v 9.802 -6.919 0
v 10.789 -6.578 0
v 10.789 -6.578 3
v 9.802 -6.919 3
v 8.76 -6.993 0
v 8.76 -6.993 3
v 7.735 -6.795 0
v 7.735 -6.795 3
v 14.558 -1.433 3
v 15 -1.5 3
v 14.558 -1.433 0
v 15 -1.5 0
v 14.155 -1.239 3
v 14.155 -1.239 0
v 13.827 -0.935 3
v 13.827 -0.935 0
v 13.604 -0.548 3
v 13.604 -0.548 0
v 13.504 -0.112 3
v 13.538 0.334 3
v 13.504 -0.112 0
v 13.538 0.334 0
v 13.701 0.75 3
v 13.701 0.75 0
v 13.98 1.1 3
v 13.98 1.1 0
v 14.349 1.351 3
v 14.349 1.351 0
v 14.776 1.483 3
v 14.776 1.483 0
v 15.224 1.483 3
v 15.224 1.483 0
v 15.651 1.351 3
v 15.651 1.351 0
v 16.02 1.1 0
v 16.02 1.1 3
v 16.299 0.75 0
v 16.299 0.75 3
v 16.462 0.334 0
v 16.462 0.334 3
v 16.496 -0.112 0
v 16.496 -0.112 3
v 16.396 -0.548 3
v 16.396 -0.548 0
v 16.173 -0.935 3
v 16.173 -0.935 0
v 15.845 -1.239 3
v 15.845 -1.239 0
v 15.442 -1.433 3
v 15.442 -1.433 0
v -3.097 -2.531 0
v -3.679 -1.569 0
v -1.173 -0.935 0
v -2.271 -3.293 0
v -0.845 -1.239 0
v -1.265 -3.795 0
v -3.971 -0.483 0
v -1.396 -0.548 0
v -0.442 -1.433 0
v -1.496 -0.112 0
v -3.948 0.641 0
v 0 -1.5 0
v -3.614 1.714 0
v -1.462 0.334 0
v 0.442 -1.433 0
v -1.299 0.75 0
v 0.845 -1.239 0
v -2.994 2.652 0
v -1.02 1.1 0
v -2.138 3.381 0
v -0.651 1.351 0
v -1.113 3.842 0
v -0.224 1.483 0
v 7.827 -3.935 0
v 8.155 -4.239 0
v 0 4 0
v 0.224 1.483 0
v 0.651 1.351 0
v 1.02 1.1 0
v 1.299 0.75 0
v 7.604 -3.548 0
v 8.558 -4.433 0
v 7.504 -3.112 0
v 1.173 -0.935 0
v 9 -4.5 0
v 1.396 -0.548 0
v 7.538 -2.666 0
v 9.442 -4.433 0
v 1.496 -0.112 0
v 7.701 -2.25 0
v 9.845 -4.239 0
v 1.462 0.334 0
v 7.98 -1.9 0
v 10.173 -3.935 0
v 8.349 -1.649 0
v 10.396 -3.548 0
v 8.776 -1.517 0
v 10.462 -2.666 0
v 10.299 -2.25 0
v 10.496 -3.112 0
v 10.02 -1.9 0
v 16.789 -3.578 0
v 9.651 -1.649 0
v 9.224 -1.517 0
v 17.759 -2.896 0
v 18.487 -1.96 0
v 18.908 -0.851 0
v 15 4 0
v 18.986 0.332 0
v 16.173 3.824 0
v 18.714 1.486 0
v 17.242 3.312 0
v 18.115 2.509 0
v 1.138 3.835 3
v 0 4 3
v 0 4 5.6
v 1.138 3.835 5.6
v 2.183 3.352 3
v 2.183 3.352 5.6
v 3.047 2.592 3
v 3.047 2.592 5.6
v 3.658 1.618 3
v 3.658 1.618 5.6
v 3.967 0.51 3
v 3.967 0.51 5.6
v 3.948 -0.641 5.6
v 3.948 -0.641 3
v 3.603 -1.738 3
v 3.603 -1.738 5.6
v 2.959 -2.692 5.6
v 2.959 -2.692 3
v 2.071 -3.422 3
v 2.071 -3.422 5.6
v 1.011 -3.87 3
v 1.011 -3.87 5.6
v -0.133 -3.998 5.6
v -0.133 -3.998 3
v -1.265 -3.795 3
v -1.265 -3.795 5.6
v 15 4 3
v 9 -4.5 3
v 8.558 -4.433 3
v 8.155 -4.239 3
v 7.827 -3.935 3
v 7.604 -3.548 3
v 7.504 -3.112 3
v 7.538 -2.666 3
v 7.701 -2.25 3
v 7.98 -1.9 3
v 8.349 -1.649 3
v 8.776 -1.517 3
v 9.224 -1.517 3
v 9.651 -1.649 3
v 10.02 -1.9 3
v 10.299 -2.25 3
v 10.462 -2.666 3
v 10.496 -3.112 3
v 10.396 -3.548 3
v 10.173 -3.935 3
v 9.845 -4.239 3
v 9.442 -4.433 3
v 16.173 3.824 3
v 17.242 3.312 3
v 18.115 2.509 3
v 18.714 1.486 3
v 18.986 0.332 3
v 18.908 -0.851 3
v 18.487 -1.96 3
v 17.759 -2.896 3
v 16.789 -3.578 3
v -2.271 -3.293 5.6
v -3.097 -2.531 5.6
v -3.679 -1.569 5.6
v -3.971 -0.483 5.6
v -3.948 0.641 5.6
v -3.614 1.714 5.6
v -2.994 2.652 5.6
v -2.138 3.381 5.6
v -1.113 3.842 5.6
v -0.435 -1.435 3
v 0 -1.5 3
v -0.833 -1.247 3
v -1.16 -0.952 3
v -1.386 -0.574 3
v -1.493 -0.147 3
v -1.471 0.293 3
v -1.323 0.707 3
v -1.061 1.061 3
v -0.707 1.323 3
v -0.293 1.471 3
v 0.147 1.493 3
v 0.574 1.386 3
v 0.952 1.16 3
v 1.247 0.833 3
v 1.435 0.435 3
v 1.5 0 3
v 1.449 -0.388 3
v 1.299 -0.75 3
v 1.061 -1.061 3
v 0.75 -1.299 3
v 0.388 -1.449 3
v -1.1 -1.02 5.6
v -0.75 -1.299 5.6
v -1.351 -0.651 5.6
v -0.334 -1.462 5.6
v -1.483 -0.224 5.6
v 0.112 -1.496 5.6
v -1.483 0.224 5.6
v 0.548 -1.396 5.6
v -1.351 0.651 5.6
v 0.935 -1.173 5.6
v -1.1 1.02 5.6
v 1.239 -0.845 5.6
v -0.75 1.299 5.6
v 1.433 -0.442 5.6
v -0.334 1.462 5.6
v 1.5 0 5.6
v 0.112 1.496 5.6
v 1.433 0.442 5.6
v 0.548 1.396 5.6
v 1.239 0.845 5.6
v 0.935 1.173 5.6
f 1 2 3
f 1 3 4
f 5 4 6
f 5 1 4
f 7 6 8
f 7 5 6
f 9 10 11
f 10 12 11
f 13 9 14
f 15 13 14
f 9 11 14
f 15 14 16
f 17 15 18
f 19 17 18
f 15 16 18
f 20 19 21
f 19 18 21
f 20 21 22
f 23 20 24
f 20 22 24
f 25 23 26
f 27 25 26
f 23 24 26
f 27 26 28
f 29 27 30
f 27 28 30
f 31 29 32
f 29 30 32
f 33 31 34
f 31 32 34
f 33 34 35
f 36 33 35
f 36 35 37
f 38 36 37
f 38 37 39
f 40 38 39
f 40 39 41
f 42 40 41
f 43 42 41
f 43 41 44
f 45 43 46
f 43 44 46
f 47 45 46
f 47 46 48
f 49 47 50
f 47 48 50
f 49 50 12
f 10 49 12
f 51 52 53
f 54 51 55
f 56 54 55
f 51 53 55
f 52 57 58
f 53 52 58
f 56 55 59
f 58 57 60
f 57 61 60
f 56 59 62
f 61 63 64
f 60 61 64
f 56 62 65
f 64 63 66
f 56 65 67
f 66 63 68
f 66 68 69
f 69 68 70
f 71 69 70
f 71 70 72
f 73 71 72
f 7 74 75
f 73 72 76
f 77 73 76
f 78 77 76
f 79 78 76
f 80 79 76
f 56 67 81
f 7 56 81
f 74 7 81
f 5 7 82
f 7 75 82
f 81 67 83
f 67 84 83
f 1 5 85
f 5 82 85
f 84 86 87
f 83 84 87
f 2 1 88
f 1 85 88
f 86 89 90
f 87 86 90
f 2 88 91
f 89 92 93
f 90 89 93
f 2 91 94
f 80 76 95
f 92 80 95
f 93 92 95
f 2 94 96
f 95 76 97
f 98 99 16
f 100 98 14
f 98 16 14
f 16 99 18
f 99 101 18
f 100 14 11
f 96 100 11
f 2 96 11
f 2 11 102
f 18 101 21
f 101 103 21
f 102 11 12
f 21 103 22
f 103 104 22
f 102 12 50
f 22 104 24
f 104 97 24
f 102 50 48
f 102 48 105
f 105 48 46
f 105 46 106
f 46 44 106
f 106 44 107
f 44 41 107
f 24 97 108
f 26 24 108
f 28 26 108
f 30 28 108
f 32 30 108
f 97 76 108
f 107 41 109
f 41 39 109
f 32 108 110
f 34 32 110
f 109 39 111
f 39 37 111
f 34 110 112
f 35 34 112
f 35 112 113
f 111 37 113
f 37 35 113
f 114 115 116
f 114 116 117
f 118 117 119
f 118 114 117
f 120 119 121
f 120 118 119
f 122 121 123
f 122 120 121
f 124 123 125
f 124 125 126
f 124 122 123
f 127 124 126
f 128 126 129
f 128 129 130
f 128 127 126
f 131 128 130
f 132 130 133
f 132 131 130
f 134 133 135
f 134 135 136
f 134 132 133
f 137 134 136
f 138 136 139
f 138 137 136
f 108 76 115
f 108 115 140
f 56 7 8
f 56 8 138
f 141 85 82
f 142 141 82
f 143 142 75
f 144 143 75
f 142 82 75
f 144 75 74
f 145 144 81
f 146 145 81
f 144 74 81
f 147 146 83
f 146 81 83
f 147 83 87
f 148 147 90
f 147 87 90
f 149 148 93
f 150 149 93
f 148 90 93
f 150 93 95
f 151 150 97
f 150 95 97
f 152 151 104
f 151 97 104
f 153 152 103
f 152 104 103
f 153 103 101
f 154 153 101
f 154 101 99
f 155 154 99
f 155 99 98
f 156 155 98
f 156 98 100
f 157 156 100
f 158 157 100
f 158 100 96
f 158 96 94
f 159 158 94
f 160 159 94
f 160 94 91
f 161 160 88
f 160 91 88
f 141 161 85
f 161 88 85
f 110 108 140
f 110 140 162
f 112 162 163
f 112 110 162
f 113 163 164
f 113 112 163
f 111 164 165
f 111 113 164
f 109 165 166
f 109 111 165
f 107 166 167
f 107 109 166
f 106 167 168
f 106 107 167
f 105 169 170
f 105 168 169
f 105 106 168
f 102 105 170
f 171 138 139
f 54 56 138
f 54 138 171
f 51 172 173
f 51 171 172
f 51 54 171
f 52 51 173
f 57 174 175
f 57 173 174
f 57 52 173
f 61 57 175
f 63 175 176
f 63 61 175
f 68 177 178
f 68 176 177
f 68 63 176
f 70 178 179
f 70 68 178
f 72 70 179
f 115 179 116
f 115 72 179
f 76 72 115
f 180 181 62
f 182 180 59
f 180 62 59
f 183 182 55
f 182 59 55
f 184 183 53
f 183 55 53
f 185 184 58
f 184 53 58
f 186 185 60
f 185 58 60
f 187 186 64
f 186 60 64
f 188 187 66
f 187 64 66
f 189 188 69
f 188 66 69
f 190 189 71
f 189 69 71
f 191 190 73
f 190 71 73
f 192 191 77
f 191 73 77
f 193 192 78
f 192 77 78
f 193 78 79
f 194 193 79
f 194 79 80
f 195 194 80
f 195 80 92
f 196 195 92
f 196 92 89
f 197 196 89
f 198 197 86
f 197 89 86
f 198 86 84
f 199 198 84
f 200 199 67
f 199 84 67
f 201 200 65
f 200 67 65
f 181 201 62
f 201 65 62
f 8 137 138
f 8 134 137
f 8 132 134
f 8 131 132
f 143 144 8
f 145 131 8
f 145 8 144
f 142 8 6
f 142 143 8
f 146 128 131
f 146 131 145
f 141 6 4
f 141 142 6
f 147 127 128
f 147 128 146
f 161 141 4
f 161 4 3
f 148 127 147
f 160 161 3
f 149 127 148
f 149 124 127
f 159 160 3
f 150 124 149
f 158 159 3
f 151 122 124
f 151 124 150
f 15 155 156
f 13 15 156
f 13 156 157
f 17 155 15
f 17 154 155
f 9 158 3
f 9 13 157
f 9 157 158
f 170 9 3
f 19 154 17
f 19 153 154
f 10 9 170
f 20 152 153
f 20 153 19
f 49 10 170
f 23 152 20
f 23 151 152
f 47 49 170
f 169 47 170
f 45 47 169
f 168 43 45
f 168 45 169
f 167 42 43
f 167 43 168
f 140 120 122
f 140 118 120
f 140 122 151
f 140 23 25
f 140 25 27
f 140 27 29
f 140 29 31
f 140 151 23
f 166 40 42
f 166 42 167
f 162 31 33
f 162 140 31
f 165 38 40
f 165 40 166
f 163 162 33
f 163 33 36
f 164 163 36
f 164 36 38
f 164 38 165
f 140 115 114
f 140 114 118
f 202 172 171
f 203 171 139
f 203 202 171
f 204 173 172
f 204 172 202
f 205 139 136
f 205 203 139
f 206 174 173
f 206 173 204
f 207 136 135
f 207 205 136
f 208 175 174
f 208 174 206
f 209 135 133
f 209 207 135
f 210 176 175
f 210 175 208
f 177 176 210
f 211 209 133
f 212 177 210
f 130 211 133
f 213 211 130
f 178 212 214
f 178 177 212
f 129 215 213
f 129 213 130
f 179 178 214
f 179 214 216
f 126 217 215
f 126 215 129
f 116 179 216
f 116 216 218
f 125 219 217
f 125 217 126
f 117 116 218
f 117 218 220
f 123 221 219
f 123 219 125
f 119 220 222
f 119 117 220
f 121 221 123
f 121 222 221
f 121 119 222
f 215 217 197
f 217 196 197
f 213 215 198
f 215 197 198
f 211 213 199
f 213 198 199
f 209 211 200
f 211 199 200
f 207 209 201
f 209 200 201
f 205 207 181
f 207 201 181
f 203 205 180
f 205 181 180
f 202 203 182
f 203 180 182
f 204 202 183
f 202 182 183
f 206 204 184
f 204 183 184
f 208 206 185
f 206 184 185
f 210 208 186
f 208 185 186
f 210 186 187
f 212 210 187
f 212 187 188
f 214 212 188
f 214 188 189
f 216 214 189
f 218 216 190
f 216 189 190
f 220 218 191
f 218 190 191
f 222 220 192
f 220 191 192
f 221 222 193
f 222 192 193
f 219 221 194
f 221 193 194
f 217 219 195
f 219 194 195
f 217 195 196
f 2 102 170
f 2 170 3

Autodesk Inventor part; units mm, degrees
ref_plane "YZ Plane" through (0, 0, 0) normal (1, 0, 0) x (0, 1, 0)
ref_plane "XZ Plane" through (0, 0, 0) normal (0, 1, 0) x (-1, 0, 0)
ref_plane "XY Plane" through (0, 0, 0) normal (0, 0, 1) x (1, 0, 0)
sketch "Skizze1" plane through (0, 0, 0) normal (0, 0, 1) x (1, 0, 0)
  line L0 (0, 0) -> (15, 0) construction
  line L1 (9, 0) -> (9, -3) construction
  arc A0 (0, 4) -> (-1.2649, -3.7947) centre (0, 0) ccw
  arc A1 (7.7351, -6.7947) -> (10.7889, -6.5777) centre (9, -3) ccw
  arc A2 (16.7889, -3.5777) -> (15, 4) centre (15, 0) ccw
  line L2 (0, 4) -> (15, 4)
  line L3 (16.7889, -3.5777) -> (10.7889, -6.5777)
  line L4 (7.7351, -6.7947) -> (-1.2649, -3.7947)
  dimension "d0" = 4
  dimension "d1" = 15
  dimension "d2" = 3
  dimension "d6" = 9
ref_plane "Arbeitsebene1" through (0, 0, 0) normal (0, 0, -1) x (1, 0, 0)
extrude "Extrusion1" add sketch "Skizze1" along normal blind 3
sketch "Skizze2" plane through (0, 0, 3) normal (0, 0, 1) x (1, 0, 0)
  arc A0 (0, 4) -> (-1.2649, -3.7947) centre (0, 0) ccw projected
  arc A1 (7.7351, -6.7947) -> (10.7889, -6.5777) centre (9, -3) ccw projected
  arc A2 (16.7889, -3.5777) -> (15, 4) centre (15, 0) ccw projected
hole "Bohrung1" at (9, -3, 3) at (15, 0, 3) at (0, 0, 3) direction (0, 0, -1) diameter 3 end through all
sketch "Skizze3" plane through (0, 0, 3) normal (0, 0, 1) x (1, 0, 0)
  circle A0 centre (0, 0) radius 1.5 projected
  arc A1 (0, 4) -> (-1.2649, -3.7947) centre (0, 0) ccw projected
  circle A2 centre (0, 0) radius 4
extrude "Extrusion2" add sketch "Skizze3" along normal blind 2.6
equation "\"d0\" = bearingWall"
equation "\"d1\" = Hebel_basis_2"
equation "\"d6\" = 0.6 * d1"
equation "\"d4\" = Join_width"
equation "\"d7\" = bearingHole"
equation "\"FingerLaenge_B\" = 25"
equation "\"Hebel_B\" = 25"
equation "\"Finger_width\" = 22"
equation "\"Finger_diameter\" = 8"
equation "\"FingerWall\" = 3"
equation "\"Hebel_basis_2\" = 15"
equation "\"Join_width\" = 3"
equation "\"bearingHole\" = 3"
equation "\"bearingWall\" = 4"
equation "\"support_D\" = 0.25"
properties part number "FingerTip_Mount dual"
